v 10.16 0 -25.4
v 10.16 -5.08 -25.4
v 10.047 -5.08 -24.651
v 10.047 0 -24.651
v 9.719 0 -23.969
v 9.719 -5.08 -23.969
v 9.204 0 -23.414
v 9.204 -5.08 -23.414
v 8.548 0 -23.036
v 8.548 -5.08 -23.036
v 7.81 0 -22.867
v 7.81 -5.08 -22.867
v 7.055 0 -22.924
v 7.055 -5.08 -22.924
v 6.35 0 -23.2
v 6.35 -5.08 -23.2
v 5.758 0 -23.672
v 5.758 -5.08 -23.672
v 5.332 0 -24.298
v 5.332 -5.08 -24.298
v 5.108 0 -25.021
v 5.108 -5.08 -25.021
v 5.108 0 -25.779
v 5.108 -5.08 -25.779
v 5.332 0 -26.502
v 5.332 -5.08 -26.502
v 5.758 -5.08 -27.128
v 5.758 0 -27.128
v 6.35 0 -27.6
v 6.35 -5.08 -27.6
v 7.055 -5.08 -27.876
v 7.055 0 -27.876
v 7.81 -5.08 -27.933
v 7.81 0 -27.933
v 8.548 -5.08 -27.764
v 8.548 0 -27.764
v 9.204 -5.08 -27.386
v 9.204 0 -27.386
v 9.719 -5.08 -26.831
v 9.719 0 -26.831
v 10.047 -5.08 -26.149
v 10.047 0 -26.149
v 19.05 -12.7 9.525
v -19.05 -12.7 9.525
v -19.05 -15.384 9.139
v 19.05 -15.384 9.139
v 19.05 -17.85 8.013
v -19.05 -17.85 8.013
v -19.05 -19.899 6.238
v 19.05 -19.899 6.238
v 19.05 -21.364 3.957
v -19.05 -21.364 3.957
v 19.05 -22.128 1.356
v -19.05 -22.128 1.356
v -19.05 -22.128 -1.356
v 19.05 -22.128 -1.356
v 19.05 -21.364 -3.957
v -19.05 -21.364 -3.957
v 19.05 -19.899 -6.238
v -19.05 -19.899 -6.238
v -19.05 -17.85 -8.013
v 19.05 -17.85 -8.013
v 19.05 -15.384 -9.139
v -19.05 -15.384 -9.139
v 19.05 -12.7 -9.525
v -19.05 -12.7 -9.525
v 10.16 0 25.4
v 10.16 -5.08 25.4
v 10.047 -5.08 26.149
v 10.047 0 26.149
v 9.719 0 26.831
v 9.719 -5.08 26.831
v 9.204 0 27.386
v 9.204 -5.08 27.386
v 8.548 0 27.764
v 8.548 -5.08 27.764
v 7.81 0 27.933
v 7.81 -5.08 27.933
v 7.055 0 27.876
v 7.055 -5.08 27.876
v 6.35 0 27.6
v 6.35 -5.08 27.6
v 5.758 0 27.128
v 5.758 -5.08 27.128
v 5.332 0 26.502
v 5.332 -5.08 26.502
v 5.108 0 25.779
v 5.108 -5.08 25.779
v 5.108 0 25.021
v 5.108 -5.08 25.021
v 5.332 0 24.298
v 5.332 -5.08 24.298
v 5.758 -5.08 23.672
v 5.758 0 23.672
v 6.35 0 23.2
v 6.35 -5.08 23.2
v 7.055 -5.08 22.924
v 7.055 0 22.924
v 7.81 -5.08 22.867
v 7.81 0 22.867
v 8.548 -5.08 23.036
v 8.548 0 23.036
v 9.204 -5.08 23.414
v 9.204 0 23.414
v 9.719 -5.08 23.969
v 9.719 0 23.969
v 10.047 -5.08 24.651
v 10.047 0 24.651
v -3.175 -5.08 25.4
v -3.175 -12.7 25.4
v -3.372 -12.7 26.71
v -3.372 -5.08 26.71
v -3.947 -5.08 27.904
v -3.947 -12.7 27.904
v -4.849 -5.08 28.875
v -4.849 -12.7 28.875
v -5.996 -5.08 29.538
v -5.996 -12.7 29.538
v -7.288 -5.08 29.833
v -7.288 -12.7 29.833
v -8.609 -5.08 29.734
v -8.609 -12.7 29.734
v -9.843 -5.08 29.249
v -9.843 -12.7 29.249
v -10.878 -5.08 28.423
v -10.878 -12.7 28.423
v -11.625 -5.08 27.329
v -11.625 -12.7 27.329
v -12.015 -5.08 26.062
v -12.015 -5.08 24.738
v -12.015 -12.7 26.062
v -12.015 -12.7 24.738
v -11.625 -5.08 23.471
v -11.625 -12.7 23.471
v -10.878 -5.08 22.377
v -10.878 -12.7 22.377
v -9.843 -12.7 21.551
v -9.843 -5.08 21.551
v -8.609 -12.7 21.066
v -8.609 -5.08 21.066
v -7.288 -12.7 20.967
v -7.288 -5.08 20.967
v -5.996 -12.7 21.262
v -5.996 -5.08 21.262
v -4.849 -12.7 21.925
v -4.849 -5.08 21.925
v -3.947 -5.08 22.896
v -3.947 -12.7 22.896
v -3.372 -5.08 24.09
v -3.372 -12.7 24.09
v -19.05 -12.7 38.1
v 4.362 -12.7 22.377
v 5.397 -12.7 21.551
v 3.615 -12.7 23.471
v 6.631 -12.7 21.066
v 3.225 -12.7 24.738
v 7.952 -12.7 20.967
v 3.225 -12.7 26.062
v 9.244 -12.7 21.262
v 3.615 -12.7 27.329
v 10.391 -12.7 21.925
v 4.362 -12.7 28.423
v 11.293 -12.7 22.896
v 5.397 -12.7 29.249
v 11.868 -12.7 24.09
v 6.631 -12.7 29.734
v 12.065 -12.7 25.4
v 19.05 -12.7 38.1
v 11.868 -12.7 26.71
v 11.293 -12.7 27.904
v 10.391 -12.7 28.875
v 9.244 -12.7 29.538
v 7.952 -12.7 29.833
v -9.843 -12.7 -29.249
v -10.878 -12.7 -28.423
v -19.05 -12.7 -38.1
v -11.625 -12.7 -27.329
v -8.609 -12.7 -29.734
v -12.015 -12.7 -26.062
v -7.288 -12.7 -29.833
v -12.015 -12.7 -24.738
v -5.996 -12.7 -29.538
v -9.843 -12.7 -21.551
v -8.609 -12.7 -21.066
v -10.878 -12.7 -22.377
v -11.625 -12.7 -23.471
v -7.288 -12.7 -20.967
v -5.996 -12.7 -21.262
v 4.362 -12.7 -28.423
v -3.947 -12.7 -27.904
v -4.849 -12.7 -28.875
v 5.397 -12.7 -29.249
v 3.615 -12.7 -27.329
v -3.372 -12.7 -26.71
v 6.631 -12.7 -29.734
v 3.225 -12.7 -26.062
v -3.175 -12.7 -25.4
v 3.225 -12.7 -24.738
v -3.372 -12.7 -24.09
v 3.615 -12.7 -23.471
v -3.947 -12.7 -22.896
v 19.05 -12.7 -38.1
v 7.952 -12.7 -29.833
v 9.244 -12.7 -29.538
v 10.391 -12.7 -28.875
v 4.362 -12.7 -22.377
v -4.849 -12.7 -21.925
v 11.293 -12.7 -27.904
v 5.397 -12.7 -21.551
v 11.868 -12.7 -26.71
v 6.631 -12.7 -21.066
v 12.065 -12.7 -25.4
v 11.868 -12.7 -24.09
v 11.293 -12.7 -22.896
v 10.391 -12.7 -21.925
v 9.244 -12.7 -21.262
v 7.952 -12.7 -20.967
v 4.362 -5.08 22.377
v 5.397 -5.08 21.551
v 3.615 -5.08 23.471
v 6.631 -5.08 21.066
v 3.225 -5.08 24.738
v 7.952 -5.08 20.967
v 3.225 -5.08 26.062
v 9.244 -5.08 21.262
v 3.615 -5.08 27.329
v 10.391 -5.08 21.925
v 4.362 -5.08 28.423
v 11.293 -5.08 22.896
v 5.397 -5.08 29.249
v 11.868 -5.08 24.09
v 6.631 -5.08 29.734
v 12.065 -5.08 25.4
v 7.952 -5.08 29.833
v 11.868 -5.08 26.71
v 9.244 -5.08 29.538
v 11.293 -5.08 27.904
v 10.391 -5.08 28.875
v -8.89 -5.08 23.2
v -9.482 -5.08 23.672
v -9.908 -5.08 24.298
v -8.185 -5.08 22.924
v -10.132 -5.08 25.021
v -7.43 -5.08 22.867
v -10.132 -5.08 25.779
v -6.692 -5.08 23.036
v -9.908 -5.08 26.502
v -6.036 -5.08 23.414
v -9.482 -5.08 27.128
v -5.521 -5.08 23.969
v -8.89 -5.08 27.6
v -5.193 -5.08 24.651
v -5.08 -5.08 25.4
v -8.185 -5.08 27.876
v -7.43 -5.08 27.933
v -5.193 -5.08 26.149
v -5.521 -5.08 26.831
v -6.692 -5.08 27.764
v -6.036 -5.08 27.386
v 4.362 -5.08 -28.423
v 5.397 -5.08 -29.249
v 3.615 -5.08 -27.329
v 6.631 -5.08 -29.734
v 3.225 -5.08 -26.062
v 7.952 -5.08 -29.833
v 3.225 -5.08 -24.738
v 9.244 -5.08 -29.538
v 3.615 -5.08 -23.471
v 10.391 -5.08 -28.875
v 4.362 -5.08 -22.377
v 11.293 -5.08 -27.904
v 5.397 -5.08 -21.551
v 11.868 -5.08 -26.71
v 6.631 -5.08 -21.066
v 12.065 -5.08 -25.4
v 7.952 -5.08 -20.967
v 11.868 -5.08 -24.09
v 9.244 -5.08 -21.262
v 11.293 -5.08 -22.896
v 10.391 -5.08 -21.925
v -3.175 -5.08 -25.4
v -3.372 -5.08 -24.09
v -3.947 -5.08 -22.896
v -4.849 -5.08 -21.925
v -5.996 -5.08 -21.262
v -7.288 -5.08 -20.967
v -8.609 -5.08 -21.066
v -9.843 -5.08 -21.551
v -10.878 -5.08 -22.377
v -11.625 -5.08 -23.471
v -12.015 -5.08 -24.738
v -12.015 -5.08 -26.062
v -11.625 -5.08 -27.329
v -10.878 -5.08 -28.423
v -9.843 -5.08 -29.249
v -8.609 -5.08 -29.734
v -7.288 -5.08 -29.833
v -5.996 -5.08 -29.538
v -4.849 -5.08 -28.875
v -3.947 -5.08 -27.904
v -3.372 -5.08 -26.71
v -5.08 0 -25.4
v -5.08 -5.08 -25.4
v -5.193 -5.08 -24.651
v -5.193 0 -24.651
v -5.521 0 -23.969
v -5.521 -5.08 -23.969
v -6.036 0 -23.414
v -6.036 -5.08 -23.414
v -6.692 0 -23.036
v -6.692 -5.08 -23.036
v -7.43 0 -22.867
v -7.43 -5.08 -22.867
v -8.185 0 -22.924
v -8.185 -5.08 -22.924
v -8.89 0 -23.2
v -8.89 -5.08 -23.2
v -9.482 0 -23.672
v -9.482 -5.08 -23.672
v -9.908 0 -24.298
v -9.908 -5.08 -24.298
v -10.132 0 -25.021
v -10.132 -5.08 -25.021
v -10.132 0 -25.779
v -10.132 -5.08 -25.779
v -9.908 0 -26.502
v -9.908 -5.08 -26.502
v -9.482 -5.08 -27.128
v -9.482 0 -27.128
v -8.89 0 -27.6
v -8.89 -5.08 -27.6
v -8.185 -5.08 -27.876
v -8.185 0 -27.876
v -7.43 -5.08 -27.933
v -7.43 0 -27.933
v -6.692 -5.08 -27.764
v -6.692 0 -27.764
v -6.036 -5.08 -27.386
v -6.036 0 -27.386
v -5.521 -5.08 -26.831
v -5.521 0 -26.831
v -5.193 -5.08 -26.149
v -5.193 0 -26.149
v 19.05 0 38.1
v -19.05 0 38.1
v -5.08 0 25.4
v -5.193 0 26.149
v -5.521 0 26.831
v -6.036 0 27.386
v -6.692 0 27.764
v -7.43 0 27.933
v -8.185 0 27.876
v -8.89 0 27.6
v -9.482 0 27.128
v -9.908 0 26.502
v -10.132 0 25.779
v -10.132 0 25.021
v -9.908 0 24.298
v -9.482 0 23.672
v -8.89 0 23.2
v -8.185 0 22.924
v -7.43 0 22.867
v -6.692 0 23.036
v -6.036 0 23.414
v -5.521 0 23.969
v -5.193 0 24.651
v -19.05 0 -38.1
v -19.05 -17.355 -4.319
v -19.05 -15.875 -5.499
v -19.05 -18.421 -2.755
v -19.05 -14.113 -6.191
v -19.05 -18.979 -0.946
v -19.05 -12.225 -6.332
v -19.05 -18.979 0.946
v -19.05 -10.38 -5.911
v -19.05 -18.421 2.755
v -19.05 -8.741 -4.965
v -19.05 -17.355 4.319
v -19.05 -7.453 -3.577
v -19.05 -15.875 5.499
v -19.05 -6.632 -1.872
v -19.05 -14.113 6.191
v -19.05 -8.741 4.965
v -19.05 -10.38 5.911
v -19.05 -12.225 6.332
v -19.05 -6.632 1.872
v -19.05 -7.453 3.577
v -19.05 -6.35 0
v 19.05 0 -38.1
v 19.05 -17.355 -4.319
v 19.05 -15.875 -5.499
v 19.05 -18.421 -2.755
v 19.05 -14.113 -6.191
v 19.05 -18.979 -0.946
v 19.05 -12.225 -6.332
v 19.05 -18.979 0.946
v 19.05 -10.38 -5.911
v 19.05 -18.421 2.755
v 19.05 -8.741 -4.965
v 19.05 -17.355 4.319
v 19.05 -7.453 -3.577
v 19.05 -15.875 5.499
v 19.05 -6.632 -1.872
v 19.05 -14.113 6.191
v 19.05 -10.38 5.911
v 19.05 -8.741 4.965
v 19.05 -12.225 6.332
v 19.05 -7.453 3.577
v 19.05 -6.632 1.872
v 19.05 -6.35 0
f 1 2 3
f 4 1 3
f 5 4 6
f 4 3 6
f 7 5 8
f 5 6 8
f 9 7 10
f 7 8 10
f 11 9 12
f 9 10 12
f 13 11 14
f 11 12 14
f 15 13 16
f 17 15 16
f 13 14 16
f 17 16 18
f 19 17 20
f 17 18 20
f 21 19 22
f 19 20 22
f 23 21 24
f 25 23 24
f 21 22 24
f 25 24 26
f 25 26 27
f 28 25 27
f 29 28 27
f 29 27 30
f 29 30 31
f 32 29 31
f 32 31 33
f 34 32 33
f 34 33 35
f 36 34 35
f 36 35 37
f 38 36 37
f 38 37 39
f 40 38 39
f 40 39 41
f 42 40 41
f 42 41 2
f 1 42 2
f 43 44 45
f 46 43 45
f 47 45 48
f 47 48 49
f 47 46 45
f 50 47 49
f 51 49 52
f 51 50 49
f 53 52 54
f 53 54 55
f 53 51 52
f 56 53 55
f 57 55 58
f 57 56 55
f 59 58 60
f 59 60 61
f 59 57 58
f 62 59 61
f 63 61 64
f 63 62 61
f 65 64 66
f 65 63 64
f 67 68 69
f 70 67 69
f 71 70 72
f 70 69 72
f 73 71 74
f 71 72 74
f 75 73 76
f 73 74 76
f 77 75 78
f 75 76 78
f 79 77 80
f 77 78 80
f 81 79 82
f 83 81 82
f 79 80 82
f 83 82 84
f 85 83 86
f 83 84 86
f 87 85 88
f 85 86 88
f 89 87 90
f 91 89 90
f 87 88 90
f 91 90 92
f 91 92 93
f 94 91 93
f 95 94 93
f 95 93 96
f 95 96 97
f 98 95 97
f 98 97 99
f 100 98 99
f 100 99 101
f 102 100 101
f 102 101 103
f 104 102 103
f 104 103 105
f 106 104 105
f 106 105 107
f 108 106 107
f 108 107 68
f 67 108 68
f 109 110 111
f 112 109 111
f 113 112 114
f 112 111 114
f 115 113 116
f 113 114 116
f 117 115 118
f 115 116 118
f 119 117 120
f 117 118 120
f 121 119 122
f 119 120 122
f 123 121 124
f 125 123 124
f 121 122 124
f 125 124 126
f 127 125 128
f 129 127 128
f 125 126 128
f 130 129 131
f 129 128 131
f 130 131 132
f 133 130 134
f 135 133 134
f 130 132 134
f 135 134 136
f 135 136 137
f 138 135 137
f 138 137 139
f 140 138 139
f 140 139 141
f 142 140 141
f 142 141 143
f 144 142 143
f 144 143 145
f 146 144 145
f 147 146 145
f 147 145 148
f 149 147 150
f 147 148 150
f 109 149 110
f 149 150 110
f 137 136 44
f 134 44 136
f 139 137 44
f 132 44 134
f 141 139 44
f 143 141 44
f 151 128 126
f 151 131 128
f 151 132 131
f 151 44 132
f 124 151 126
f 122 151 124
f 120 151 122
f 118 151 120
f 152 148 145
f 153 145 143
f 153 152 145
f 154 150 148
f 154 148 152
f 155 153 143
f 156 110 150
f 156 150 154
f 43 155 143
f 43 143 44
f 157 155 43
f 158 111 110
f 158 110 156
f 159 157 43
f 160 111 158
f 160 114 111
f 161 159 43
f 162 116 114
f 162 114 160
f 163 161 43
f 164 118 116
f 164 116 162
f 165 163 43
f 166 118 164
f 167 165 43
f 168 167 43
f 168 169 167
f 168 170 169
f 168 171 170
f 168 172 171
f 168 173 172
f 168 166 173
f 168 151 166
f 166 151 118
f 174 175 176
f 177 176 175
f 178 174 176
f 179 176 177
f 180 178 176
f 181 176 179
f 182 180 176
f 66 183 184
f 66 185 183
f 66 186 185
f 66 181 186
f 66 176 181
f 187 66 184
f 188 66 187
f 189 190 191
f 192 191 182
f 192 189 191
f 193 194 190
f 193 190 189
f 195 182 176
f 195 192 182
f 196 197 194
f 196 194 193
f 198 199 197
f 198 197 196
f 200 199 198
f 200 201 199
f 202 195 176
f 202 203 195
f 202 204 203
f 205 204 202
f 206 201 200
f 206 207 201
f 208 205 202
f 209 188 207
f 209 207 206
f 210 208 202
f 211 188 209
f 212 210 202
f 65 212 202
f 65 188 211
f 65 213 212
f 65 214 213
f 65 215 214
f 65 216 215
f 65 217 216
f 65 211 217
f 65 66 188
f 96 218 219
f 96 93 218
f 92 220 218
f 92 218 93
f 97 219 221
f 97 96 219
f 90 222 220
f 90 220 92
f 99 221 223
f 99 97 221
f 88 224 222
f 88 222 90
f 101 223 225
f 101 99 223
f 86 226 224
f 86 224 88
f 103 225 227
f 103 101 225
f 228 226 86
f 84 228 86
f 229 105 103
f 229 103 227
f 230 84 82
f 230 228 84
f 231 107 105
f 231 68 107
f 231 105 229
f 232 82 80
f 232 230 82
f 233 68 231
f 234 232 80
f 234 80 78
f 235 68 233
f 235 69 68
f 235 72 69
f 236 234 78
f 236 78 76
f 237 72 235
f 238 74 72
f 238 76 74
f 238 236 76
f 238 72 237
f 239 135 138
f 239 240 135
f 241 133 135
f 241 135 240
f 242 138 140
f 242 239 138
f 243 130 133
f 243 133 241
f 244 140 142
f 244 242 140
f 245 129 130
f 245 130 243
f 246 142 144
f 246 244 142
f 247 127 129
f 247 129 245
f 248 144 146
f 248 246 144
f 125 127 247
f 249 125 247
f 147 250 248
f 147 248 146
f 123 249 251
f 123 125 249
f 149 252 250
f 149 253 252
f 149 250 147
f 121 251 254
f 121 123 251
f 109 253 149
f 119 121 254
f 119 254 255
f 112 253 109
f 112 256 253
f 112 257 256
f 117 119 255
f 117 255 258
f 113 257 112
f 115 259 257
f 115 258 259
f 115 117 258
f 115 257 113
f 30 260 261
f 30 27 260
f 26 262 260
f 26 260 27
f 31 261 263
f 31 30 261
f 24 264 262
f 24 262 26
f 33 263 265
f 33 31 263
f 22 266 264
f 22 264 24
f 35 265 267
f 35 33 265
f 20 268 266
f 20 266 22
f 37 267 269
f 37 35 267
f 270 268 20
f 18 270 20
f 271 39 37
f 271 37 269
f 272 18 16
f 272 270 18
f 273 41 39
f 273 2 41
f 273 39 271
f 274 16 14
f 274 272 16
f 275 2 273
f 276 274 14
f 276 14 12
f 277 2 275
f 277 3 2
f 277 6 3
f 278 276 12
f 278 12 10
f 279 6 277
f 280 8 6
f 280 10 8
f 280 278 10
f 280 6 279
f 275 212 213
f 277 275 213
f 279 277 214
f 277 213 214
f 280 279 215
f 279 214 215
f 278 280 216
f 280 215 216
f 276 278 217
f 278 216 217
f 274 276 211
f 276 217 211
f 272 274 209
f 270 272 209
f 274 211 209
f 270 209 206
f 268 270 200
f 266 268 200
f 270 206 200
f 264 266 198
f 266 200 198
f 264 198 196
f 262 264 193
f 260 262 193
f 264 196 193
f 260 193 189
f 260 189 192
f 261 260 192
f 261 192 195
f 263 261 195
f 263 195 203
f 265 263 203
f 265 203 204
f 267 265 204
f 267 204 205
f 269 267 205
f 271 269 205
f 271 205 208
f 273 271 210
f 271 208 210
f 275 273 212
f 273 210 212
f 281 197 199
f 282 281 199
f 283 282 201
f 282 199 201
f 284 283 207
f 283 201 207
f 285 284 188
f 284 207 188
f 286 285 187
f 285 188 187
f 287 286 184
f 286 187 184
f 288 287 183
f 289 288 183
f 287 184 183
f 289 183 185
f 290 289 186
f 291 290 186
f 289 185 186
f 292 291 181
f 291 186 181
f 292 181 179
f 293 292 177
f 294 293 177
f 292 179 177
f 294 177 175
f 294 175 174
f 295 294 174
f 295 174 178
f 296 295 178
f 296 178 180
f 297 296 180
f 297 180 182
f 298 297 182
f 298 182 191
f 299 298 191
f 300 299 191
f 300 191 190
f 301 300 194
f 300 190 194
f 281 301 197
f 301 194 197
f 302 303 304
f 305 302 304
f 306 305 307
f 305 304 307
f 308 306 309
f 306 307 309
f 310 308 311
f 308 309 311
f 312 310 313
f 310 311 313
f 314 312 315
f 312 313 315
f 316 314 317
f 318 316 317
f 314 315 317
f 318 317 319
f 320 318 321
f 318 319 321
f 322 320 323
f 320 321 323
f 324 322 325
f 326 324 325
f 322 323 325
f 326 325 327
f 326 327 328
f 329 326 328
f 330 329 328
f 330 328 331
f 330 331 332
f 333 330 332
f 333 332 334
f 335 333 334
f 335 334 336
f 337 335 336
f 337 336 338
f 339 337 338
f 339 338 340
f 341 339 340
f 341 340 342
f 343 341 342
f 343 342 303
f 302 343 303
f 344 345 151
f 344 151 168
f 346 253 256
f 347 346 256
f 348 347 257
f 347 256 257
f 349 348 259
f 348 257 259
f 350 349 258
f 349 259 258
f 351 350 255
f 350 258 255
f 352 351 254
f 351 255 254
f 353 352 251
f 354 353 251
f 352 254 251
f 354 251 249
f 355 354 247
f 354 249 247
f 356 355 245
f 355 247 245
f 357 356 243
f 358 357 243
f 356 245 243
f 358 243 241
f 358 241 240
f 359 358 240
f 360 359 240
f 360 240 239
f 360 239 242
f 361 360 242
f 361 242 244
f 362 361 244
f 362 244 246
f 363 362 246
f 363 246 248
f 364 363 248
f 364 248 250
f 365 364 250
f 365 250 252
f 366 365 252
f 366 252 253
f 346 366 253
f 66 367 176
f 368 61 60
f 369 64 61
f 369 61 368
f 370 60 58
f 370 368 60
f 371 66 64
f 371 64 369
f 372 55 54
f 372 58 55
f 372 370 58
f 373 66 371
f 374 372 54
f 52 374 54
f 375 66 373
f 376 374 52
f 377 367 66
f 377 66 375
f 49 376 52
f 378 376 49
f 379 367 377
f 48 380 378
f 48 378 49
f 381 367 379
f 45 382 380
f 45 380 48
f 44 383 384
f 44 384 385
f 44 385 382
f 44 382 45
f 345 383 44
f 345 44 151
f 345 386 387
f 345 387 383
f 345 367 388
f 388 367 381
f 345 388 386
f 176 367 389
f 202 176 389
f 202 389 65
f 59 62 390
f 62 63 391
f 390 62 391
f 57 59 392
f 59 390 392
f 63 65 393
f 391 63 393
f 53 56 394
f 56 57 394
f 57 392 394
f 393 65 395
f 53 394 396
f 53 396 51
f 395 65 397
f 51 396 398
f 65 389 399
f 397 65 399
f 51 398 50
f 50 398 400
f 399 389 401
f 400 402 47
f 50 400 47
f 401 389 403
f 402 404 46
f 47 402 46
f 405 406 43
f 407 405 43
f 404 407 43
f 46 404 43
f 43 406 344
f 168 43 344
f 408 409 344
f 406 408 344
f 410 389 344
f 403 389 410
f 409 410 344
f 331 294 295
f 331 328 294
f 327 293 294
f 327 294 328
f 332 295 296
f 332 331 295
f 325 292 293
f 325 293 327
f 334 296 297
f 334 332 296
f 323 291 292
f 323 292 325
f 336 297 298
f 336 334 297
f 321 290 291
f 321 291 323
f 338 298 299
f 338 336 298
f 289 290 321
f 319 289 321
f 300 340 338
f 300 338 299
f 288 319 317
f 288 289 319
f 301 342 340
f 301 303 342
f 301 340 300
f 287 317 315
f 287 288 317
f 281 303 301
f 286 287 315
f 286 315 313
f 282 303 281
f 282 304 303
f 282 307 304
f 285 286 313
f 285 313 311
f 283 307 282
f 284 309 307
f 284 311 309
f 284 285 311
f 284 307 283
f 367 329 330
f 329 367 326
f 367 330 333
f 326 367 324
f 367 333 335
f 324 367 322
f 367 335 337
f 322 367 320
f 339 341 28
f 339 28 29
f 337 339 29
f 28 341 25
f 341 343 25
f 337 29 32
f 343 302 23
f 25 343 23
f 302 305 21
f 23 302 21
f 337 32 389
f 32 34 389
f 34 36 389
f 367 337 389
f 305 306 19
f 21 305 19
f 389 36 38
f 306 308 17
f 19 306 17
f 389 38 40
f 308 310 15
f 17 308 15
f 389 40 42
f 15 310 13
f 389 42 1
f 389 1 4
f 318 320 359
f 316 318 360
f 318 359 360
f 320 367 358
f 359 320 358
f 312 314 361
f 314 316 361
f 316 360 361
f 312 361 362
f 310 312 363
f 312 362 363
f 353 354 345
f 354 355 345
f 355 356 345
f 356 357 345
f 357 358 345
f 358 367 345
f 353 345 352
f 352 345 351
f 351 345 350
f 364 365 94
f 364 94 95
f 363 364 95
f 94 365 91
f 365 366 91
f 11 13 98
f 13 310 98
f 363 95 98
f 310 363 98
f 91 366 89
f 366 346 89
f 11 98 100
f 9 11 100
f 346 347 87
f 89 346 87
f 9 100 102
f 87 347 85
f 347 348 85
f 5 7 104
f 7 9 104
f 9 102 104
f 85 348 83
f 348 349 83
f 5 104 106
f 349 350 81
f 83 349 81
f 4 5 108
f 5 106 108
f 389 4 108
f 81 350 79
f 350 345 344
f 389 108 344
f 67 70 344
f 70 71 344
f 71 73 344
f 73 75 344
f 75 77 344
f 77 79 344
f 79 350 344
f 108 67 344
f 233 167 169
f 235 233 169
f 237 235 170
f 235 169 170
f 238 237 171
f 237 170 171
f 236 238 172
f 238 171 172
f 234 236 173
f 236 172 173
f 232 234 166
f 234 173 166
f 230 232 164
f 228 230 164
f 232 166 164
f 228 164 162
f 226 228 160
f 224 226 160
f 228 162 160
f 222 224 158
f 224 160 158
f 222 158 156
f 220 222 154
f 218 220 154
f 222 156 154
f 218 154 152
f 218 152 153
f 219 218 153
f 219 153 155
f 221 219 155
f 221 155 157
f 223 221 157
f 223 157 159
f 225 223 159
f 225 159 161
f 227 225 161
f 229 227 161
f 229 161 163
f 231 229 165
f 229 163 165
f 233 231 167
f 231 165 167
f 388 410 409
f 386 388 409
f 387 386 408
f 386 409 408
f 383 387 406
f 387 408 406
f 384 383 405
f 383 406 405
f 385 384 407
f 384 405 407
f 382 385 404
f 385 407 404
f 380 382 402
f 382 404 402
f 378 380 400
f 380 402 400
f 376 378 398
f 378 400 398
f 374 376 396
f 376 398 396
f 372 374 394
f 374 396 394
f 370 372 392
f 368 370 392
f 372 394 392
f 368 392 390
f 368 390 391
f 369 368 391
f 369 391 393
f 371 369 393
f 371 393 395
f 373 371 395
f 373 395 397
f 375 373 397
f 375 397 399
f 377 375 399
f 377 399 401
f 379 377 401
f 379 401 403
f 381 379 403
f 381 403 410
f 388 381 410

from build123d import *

# Parameters (mm, degrees)
F0_W     = 38.1
F0_H     = 76.2
F1_DEPTH = 12.7
F2_R     = 9.525
F3_DEPTH = 38.1
F4_R     = 6.35
F5_DEPTH = 40.386
F6_R     = 2.54
F7_DEPTH = 25.4
F8_R     = 4.445
F9_DEPTH = 7.62


with BuildPart() as f1:
    # F0 (on Front) → F1 (new body)
    with BuildSketch(Plane.XZ):
        Rectangle(F0_W, F0_H)
    extrude(amount=F1_DEPTH)

    # F2 (on face) → F3 (join)
    with BuildSketch(Plane.YZ.offset(19.05)):
        with Locations((-12.7, 0)):
            Circle(F2_R)
    extrude(amount=-F3_DEPTH)

    # F4 (on face) → F5 (cut)
    with BuildSketch(Plane.YZ.offset(19.05)):
        with Locations((-12.7, 0)):
            Circle(F4_R)
    extrude(amount=-F5_DEPTH, mode=Mode.SUBTRACT)

    # F6 (on face) → F7 (cut)
    with BuildSketch(Plane.XZ.offset(12.7)):
        with Locations((-7.62, 25.4)):
            Circle(F6_R)
        with Locations((7.62, 25.4)):
            Circle(F6_R)
        with Locations((-7.62, -25.4)):
            Circle(F6_R)
        with Locations((7.62, -25.4)):
            Circle(F6_R)
    extrude(amount=-F7_DEPTH, mode=Mode.SUBTRACT)

    # F8 (on face) → F9 (cut)
    with BuildSketch(Plane.XZ.offset(12.7)):
        with Locations((-7.62, 25.4)):
            Circle(F8_R)
        with Locations((7.62, 25.4)):
            Circle(F8_R)
        with Locations((-7.62, -25.4)):
            Circle(F8_R)
        with Locations((7.62, -25.4)):
            Circle(F8_R)
    extrude(amount=-F9_DEPTH, mode=Mode.SUBTRACT)


solid = f1.part
